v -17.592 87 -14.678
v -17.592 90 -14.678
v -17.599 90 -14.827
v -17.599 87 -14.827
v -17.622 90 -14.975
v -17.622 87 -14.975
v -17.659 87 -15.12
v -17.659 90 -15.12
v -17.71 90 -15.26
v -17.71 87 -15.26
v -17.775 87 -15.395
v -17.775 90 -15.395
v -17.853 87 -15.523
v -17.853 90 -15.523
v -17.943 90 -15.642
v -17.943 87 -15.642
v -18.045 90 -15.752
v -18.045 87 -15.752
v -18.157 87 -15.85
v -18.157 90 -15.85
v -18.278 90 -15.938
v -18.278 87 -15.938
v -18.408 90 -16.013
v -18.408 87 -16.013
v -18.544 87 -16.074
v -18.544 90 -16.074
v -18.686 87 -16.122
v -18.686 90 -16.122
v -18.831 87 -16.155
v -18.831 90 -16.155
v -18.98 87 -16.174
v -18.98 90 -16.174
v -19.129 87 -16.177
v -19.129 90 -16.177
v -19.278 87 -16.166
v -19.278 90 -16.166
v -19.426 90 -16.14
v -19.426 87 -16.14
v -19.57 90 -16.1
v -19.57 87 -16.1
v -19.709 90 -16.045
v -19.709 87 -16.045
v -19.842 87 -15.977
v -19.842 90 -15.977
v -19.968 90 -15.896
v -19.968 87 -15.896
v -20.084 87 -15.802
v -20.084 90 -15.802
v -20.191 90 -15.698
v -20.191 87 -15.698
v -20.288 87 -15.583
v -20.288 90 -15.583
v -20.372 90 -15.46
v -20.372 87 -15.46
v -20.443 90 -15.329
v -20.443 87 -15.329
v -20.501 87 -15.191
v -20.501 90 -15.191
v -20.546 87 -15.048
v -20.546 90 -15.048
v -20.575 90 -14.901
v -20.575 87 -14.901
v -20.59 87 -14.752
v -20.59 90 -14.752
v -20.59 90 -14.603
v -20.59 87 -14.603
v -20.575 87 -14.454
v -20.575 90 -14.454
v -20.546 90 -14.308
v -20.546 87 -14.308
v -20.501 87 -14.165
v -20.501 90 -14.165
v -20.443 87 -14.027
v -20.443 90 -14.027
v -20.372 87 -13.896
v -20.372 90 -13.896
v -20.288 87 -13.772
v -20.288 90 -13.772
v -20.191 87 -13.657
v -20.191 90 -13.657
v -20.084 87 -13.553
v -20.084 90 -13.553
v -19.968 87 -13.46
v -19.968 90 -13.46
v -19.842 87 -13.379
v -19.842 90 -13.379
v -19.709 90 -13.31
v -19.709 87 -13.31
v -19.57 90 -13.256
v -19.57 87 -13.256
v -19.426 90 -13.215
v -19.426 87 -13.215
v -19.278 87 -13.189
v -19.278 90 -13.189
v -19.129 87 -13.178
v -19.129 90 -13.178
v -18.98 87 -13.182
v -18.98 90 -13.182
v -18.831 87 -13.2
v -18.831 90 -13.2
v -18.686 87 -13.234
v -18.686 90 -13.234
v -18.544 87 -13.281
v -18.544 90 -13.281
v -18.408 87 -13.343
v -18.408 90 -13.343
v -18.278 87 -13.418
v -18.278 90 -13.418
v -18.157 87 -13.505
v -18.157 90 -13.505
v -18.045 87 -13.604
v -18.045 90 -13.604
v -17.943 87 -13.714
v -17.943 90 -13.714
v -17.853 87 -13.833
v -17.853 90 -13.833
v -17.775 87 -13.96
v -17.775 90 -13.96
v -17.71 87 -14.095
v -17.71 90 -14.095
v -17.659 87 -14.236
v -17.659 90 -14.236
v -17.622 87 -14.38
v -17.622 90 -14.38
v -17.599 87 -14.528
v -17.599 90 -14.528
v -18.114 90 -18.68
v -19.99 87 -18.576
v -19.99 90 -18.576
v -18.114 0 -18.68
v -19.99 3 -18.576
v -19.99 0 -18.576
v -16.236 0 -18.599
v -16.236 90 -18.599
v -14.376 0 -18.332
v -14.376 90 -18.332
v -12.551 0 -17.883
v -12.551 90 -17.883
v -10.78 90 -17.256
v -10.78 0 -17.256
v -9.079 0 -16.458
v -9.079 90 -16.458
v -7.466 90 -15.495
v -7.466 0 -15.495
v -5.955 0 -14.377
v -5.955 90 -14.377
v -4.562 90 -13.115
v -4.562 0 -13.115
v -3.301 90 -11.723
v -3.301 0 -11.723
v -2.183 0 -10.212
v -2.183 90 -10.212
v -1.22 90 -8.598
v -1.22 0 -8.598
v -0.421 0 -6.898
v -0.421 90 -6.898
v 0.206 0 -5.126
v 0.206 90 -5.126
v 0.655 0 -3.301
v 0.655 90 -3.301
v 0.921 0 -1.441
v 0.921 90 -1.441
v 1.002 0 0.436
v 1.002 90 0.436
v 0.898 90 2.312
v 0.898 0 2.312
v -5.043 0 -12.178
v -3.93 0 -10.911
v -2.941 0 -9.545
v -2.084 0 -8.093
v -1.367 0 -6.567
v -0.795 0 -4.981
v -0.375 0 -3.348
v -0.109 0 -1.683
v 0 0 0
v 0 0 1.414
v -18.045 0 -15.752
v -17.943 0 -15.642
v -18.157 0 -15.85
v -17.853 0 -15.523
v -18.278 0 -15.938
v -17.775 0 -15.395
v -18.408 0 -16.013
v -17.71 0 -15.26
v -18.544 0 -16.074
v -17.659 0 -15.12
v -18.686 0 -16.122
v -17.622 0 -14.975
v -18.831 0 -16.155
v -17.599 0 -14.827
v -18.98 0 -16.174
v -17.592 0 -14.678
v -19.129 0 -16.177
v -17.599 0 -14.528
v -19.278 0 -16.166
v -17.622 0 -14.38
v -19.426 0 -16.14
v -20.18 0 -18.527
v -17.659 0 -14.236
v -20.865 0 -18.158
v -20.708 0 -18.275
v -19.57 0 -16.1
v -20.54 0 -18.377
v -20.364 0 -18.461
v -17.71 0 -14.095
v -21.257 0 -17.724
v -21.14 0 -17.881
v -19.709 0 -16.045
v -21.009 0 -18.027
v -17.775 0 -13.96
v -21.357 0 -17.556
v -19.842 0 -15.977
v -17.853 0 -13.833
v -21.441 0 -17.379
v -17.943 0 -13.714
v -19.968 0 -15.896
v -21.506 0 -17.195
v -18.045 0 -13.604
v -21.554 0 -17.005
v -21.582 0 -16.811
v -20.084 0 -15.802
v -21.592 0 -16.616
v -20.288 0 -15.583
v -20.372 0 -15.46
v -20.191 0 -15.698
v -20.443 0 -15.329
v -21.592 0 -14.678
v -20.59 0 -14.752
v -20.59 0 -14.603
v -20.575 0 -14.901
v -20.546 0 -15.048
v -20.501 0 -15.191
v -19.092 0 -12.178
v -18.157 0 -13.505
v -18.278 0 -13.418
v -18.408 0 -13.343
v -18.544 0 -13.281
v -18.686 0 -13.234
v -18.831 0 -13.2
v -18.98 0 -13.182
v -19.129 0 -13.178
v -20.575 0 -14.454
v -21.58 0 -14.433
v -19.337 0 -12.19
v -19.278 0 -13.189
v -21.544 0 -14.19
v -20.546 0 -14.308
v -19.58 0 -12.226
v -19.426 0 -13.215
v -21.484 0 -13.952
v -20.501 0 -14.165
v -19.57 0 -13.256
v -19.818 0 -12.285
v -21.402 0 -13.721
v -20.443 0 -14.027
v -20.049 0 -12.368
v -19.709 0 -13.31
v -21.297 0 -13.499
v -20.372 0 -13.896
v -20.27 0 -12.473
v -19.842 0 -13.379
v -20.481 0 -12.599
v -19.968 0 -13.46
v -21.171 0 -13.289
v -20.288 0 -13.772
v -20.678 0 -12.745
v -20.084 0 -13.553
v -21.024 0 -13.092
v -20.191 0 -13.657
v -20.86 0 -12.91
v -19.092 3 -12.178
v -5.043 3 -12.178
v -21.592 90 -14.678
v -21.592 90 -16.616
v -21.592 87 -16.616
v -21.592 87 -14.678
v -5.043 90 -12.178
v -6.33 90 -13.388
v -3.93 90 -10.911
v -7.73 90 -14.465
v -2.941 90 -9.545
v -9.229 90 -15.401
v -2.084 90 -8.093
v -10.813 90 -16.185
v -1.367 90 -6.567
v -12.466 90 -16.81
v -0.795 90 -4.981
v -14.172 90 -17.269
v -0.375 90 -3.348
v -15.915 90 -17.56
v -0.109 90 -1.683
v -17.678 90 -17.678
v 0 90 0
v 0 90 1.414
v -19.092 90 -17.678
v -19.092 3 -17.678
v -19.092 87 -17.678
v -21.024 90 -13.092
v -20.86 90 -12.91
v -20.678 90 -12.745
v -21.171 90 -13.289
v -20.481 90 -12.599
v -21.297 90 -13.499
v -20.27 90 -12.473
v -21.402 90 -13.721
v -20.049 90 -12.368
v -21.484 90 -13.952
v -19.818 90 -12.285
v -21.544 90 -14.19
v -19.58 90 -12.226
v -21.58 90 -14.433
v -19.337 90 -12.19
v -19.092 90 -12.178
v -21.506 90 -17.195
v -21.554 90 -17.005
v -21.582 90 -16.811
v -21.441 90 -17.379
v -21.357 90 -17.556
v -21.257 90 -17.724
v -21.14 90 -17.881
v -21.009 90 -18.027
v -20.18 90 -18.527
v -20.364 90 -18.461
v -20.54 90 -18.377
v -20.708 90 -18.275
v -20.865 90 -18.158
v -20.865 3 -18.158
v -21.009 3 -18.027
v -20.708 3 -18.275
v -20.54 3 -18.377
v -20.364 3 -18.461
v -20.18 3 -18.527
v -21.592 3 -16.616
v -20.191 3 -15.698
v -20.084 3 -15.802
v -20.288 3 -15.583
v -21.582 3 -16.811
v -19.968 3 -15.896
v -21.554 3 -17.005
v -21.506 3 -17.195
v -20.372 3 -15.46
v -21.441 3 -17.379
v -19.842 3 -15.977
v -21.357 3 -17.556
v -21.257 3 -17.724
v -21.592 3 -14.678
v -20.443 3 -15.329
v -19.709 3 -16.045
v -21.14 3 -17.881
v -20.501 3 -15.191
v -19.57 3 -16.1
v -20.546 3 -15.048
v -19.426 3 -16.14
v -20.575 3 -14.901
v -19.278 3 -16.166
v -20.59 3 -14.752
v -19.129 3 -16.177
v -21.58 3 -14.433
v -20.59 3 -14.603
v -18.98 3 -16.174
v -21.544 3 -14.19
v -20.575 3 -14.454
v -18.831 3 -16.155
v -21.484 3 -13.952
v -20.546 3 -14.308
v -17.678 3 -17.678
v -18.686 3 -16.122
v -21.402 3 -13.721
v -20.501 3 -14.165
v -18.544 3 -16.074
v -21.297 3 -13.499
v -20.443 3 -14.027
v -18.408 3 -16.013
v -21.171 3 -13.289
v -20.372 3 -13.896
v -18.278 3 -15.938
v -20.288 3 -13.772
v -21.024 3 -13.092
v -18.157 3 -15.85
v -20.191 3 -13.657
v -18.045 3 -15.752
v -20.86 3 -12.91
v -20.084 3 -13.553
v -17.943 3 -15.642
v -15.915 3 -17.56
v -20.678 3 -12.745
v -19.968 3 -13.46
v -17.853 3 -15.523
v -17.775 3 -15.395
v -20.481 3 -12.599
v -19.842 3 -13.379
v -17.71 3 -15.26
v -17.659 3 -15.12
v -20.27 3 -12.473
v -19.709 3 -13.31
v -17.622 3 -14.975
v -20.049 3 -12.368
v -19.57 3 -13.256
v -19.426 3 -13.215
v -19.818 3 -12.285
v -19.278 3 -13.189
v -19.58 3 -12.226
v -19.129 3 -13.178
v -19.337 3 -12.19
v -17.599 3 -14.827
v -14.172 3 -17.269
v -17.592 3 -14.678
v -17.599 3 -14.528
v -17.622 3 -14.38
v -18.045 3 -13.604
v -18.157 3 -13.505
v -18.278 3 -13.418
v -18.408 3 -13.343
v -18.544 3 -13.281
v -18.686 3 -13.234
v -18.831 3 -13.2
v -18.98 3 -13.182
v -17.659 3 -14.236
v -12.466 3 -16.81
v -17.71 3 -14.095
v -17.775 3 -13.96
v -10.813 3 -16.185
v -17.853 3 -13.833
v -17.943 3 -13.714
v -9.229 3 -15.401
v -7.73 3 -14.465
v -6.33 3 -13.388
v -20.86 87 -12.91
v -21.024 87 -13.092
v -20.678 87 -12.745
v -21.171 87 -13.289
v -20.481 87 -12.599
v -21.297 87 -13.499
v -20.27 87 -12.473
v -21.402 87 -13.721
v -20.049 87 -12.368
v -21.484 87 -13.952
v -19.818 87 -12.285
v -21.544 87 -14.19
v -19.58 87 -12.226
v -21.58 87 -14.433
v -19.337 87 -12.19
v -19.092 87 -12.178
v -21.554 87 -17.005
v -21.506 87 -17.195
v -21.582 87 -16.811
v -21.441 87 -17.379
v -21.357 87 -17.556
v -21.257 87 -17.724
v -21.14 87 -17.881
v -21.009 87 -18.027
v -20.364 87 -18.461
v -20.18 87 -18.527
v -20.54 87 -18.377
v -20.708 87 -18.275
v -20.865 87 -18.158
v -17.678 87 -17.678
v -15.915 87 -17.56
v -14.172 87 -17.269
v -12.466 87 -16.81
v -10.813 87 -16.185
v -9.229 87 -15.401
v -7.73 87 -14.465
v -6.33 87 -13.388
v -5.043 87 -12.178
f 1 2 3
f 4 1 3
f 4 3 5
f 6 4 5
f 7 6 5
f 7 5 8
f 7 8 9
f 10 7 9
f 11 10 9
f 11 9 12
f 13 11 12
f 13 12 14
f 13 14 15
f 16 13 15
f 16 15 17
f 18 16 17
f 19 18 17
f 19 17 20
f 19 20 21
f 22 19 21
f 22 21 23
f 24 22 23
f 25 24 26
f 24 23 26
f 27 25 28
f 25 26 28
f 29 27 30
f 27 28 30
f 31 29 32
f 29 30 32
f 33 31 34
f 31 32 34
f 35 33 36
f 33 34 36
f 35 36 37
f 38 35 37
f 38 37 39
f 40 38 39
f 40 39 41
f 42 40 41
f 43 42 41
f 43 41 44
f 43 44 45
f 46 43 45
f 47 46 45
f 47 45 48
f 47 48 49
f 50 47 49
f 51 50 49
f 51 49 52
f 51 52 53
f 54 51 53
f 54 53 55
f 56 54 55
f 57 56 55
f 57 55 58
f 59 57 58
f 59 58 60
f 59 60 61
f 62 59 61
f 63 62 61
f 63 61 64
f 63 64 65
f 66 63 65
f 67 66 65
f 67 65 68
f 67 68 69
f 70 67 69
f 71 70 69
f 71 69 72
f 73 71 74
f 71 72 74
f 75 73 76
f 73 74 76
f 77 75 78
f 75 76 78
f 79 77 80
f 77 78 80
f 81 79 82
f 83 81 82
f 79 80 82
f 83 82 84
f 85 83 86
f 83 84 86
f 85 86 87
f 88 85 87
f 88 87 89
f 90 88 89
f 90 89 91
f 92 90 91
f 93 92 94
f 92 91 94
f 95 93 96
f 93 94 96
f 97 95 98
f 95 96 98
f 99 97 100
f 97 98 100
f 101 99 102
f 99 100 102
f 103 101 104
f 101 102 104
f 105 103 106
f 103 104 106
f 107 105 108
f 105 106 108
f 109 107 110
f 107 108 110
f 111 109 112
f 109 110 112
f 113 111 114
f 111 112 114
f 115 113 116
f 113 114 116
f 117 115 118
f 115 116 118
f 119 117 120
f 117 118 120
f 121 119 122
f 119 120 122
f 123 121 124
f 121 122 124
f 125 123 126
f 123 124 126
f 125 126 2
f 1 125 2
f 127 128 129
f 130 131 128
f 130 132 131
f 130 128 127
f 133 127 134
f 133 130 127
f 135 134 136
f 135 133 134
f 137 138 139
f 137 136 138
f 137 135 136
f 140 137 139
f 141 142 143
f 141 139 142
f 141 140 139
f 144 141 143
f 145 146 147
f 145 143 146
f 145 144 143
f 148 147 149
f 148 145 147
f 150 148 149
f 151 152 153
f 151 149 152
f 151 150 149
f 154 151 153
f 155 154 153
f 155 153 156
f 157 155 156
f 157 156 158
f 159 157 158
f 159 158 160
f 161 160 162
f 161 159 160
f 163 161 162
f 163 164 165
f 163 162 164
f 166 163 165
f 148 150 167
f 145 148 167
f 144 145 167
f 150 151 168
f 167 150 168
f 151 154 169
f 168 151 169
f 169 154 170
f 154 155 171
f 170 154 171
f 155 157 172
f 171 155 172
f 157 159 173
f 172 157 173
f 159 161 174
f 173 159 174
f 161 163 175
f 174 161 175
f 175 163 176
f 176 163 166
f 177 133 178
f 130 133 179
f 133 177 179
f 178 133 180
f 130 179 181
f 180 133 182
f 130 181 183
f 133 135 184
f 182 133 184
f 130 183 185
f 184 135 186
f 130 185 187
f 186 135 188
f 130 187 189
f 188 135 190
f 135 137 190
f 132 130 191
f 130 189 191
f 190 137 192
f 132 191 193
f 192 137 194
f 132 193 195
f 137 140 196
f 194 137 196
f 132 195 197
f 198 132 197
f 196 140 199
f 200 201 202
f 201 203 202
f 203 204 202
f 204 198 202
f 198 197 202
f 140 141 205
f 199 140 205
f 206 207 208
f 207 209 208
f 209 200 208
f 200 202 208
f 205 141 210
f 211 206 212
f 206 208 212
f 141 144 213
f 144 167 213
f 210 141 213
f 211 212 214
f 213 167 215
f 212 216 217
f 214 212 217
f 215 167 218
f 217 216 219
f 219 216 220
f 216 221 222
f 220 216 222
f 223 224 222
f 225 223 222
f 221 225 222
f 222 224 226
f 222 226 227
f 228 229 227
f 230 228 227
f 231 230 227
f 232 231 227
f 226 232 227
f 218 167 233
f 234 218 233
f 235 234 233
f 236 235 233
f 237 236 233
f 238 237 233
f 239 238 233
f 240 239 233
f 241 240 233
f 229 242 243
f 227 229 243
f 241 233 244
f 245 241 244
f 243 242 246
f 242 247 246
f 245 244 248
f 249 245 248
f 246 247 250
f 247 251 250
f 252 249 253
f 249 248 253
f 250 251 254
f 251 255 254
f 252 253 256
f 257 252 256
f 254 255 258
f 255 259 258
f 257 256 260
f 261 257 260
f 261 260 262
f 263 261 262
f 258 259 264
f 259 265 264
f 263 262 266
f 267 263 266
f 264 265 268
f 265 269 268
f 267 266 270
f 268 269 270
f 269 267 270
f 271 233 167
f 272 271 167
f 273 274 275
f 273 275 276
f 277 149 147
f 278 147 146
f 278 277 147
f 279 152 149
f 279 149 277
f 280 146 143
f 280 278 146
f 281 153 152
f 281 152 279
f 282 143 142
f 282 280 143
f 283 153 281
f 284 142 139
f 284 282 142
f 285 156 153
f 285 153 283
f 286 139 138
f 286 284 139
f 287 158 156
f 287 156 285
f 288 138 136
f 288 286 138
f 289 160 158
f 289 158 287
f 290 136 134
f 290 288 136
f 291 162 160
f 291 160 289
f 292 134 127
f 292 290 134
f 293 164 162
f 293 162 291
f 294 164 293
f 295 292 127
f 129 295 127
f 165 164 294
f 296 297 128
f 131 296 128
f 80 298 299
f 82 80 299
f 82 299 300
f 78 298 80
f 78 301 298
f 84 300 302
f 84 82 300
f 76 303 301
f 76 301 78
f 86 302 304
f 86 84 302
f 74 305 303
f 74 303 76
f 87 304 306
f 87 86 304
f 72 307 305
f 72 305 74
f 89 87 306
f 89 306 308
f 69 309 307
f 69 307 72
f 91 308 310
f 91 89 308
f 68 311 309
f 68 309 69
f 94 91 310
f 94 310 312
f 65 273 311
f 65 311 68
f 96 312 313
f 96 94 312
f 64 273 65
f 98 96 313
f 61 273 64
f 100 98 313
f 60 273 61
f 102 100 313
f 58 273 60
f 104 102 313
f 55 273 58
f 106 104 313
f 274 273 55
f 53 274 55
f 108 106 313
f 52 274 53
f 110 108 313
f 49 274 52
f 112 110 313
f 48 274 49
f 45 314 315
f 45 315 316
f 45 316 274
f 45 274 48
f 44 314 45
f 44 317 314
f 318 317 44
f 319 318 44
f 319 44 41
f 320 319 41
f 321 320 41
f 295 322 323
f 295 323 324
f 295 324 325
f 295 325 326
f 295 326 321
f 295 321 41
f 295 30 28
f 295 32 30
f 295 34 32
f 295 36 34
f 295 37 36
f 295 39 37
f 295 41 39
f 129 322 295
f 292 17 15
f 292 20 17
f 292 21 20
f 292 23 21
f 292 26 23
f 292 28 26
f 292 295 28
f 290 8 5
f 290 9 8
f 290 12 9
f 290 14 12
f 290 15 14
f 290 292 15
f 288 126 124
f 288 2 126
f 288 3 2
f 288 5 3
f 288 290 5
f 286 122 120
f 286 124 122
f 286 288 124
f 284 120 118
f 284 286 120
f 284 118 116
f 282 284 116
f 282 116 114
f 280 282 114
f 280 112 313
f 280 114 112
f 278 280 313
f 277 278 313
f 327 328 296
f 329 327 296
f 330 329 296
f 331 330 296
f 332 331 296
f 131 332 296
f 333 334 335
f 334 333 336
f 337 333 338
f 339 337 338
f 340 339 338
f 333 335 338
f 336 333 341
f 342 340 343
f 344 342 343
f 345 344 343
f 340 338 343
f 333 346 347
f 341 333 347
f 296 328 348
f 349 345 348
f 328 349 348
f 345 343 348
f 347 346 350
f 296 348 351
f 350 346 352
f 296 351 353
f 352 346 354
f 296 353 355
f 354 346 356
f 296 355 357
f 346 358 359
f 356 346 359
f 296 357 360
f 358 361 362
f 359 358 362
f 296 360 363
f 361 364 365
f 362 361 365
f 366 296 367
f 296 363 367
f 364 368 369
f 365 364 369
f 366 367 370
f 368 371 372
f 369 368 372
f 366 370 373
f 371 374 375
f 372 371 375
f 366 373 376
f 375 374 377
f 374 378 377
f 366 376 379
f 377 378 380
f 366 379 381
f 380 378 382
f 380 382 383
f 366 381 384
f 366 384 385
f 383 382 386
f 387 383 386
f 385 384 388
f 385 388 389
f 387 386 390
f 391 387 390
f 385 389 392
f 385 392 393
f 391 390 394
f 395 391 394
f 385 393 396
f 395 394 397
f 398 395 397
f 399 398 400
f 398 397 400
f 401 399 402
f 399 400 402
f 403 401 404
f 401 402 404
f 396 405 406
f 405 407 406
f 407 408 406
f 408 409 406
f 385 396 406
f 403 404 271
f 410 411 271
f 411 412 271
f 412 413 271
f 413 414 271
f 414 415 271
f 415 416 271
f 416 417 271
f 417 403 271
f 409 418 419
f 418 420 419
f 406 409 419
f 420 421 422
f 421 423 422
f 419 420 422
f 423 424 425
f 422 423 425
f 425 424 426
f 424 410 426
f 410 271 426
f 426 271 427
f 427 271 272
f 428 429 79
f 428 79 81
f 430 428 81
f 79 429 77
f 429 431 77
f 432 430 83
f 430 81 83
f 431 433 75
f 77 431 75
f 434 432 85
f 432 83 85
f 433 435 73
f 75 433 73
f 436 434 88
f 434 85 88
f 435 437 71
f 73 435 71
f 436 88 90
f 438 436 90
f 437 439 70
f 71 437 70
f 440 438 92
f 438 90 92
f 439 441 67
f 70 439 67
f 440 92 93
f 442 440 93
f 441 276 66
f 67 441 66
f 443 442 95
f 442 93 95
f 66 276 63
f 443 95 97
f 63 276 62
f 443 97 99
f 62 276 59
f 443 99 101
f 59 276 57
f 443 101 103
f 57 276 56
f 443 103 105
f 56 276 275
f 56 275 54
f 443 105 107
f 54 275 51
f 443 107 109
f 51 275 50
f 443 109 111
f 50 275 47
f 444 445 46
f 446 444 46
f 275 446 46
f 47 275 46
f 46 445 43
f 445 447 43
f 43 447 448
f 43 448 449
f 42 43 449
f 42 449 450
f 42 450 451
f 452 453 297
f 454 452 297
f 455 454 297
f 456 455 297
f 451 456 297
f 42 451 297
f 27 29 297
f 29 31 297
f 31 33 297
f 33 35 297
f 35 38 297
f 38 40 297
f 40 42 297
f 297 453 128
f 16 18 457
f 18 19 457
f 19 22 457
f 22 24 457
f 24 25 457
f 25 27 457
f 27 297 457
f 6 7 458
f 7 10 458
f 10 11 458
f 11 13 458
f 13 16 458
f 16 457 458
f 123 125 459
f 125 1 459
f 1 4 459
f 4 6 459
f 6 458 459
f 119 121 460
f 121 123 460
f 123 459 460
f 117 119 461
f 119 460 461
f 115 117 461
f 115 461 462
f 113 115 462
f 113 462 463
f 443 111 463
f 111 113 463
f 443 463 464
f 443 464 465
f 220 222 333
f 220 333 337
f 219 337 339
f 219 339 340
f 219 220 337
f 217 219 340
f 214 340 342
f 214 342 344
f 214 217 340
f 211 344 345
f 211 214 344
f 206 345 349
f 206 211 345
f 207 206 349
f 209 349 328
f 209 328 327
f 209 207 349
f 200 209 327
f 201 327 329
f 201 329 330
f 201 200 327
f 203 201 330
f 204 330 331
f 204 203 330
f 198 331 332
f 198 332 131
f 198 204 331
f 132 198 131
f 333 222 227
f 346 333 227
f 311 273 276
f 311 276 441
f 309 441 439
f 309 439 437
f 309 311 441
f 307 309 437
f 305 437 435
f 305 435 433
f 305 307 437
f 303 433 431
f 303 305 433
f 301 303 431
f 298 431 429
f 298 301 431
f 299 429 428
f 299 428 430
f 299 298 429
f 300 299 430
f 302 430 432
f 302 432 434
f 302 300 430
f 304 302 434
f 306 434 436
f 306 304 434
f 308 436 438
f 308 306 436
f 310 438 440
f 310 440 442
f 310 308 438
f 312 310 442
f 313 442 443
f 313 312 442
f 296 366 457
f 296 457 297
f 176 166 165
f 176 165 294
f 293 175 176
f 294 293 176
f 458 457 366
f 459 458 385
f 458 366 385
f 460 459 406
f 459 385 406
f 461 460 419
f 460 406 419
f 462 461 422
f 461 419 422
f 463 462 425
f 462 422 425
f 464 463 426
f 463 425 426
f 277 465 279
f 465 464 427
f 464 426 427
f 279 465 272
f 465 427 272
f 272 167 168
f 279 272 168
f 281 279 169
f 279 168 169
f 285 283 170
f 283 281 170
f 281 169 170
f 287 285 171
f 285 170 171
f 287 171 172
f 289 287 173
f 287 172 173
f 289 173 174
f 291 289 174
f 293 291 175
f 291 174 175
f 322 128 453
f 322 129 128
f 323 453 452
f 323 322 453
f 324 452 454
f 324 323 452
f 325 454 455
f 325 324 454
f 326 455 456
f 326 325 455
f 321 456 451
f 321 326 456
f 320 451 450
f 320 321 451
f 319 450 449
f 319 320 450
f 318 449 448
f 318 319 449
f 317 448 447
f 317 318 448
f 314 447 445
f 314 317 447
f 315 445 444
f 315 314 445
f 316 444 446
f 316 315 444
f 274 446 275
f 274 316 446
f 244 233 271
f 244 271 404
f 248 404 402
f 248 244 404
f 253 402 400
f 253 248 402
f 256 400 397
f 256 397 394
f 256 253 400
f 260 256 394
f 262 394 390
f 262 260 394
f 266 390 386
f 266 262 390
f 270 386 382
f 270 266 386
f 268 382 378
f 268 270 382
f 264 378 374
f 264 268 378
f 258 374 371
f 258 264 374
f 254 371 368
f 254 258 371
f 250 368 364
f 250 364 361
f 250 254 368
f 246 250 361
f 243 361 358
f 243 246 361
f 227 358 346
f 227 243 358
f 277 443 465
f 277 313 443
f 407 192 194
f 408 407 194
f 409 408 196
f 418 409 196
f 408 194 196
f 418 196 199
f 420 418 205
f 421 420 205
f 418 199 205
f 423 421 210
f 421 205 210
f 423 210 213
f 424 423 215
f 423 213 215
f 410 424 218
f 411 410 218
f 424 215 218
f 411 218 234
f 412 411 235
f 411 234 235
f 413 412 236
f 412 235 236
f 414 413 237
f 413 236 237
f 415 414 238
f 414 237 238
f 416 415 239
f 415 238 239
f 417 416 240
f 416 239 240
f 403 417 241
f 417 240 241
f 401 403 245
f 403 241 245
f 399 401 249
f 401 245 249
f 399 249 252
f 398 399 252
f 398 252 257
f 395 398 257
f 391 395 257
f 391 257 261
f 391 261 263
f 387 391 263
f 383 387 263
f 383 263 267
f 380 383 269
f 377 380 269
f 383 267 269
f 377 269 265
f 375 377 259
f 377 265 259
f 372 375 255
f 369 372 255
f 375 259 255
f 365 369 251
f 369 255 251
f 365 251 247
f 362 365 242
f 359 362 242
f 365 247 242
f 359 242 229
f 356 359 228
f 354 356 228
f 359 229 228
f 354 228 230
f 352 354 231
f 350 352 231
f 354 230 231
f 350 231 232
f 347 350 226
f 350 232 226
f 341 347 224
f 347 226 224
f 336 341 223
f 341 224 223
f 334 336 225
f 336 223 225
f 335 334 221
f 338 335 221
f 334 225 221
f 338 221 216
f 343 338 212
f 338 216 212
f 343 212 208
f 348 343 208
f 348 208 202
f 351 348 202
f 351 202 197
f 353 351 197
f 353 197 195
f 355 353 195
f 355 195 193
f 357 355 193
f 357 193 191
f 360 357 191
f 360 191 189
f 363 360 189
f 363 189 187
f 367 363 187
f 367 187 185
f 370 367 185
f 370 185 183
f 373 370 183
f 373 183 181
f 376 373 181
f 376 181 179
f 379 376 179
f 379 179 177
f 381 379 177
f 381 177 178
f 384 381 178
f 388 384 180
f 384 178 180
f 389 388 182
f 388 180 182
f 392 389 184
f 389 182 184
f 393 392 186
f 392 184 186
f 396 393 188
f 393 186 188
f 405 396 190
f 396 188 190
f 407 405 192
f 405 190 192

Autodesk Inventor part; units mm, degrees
ref_plane "YZ Plane" through (0, 0, 0) normal (1, 0, 0) x (0, 1, 0)
ref_plane "XZ Plane" through (0, 0, 0) normal (0, 1, 0) x (-1, 0, 0)
ref_plane "XY Plane" through (0, 0, 0) normal (0, 0, 1) x (1, 0, 0)
sketch "스케치1" plane through (0, 0, 0) normal (0, 1, 0) x (-1, 0, 0)
  arc A0 (0, 0) -> (17.6777, -17.6777) centre (17.9972, 0.3195) ccw
  line L0 (0, 0) -> (17.6777, -17.6777) construction
  line L1 (0, 0) -> (25, 0) construction
  arc A1 (-0.898, 2.3123) -> (19.9899, -18.5757) centre (17.9972, 0.3195) ccw
  line L2 (-0.898, 2.3123) -> (19.9899, -18.5757)
  line L3 (0, 0) -> (0, 1.4142)
  line L4 (17.6777, -17.6777) -> (19.0919, -17.6777)
  dimension "d0" = 25
  dimension "d1" = 45
  dimension "d2" = 18
  dimension "d3" = 1
extrude "돌출1" add sketch "스케치1" along normal blind 90 contours A0 L4 L2 A1 L3
sketch "스케치2" plane through (0, 0, 0) normal (0, -1, 0) x (1, 0, 0)
  circle A0 centre (-19.0919, -14.6777) radius 1.5
  arc A1 (-17.6777, -17.6777) -> (0, 0) centre (-17.9972, 0.3195) ccw projected
  circle A2 centre (-19.0919, -14.6777) radius 2.5
  line L0 (-19.0919, -12.1777) -> (-5.0426, -12.1777)
  line L1 (-21.5919, -14.6777) -> (-21.5919, -18.2148)
  line L2 (-21.5919, -14.6777) -> (-18.0548, -14.6777) construction
  line L3 (-19.9899, -18.5757) -> (-19.0919, -17.6777) projected
  line L4 (-19.9899, -18.5757) -> (-21.5919, -18.5757)
  line L5 (-21.5919, -18.5757) -> (-21.5919, -18.2148)
  line L6 (0, 0) -> (0, 1.4142) projected
  line L7 (0, 1.4142) -> (0.898, 2.3123) projected
  arc A3 (-19.9899, -18.5757) -> (0.898, 2.3123) centre (-17.9972, 0.3195) ccw projected
  line L8 (-19.9899, -18.5757) -> (-19.0919, -17.6777) projected
  line L9 (-19.0919, -17.6777) -> (-17.6777, -17.6777) projected
  arc A4 (-17.6777, -17.6777) -> (0, 0) centre (-17.9972, 0.3195) ccw projected
  point P0 (-17.6777, -17.6777)
  dimension "d6" = 3
  dimension "d7" = 3
  dimension "d8" = 1
  dimension "d9" = 90
extrude "돌출2" add sketch "스케치2" against normal blind 3 contours L9 L3 L4 L5 L1 A2 L0 A1 | A2
fillet "모깎기1" radius 2 1 edges at (-21.5919, 1.5, -18.5757)
sketch "스케치3" plane through (0, 90, 0) normal (0, 1, 0) x (1, 0, 0)
  arc A0 (-19.9899, 18.5757) -> (-21.5919, 16.6157) centre (-19.5919, 16.6157) ccw projected
  line L0 (-21.5919, 16.6157) -> (-21.5919, 14.6777) projected
  arc A1 (-21.5919, 14.6777) -> (-19.0919, 12.1777) centre (-19.0919, 14.6777) ccw projected
  line L1 (-19.0919, 12.1777) -> (-5.0426, 12.1777) projected
  arc A2 (-5.0426, 12.1777) -> (-17.6777, 17.6777) centre (-17.9972, -0.3195) ccw projected
  line L2 (-19.0919, 17.6777) -> (-17.6777, 17.6777) projected
  line L3 (-19.9899, 18.5757) -> (-19.0919, 17.6777) projected
  circle A3 centre (-19.0919, 14.6777) radius 1.5 projected
  point P0 (0, 0)
extrude "돌출3" add sketch "스케치3" against normal blind 3
properties part number "wind blade"
